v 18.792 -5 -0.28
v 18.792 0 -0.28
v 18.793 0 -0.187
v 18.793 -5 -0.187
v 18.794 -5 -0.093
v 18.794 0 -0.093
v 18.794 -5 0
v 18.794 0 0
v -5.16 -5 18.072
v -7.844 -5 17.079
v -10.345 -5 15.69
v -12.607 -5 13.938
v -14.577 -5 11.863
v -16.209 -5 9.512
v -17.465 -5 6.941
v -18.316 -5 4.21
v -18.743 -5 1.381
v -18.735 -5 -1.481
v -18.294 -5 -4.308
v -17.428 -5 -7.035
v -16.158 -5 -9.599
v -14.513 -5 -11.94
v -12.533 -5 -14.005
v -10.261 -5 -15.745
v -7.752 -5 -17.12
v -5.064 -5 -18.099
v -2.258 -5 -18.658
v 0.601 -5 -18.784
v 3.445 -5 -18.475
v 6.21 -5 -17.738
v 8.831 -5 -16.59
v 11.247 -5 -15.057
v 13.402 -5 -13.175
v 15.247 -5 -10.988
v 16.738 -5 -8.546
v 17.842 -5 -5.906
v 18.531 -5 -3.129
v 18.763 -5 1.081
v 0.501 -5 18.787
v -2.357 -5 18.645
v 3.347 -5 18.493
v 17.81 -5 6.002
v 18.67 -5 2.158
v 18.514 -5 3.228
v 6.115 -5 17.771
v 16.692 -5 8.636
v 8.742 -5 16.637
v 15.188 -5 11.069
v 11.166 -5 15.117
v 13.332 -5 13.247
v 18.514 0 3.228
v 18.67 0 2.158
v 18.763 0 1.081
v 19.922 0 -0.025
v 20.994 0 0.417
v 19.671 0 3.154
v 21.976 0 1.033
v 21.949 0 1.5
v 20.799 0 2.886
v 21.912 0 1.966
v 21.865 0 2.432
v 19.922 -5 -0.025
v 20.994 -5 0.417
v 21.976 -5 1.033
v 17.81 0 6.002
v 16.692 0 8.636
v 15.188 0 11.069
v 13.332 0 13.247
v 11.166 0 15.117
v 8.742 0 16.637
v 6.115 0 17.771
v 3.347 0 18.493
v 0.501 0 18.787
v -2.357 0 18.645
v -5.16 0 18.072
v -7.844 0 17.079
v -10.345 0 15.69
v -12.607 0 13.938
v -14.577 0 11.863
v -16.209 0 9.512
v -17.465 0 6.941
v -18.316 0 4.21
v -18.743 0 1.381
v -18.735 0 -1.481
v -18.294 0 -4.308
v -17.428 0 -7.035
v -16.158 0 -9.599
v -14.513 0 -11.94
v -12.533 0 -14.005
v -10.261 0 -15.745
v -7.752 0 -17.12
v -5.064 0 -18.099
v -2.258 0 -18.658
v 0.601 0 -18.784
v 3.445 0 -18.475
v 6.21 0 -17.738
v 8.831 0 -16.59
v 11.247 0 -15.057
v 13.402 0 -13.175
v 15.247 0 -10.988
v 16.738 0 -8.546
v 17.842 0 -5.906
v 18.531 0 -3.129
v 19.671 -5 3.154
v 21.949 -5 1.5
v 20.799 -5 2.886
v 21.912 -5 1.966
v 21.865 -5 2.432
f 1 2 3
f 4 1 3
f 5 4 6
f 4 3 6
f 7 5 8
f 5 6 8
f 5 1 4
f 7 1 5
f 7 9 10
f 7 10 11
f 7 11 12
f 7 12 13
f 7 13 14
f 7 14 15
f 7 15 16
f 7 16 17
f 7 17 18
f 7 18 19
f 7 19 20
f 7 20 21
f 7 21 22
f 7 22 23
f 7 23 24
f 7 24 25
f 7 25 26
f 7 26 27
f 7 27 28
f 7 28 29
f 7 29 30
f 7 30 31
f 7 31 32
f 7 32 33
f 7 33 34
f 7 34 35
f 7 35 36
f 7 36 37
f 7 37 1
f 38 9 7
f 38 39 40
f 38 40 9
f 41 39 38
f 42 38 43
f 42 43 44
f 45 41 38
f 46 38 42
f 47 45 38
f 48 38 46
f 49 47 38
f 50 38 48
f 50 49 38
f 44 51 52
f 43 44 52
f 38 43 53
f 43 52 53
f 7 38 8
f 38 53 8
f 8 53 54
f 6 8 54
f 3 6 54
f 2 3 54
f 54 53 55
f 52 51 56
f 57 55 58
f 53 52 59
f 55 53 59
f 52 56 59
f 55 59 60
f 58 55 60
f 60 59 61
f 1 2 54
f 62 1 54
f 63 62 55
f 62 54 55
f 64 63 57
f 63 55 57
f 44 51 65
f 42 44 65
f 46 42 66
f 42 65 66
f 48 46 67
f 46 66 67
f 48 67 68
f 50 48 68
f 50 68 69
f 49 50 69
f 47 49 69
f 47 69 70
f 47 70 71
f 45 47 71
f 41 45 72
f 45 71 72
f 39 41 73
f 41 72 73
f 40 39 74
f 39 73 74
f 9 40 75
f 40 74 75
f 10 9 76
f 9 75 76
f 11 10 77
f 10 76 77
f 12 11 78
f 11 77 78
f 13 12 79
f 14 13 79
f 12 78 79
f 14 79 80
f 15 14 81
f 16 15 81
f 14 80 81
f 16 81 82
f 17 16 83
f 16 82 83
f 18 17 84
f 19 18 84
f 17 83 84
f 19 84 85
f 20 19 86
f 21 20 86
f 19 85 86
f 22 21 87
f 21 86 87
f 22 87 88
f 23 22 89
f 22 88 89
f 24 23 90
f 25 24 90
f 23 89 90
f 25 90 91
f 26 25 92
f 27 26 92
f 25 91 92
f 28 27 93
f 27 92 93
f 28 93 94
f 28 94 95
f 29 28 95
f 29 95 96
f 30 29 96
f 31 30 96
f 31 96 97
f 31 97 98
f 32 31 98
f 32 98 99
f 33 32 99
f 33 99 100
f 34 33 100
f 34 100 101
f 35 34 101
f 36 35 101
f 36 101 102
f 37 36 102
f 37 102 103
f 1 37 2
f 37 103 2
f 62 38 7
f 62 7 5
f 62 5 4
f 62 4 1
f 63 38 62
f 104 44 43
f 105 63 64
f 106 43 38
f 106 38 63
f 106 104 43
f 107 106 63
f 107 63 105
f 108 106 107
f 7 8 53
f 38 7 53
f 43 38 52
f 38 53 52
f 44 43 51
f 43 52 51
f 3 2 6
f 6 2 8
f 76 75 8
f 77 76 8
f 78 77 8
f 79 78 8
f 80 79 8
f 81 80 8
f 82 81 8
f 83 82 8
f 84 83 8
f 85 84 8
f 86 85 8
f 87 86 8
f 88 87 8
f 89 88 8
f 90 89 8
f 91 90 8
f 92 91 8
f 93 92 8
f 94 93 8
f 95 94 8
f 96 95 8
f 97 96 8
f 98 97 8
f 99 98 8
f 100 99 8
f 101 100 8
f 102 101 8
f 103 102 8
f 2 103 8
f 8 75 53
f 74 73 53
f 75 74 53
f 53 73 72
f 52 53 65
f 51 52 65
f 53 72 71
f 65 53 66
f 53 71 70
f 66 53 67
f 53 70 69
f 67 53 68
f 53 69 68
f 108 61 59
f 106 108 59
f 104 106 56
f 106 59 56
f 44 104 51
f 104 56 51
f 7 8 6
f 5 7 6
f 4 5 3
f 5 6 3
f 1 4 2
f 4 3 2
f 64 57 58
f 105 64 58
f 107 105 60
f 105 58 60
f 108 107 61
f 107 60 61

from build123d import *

# Parameters (mm, degrees)
F1_DEPTH = 5
F2_DEPTH = 5


with BuildPart() as f1:
    # F0 (on Front) → F1 (new body)
    with BuildSketch(Plane.XZ):
        with BuildLine():
            ThreePointArc((18.791765, -0.2801), (18.793331, -0.140054), (18.793852, 0))
            ThreePointArc((18.793852, 0), (18.72388, 1.620246), (18.514485, 3.228427))
            ThreePointArc((18.514485, 3.228427), (-18.735435, -1.480668), (18.791765, -0.2801))
        make_face()
    extrude(amount=F1_DEPTH)


with BuildPart() as f2:
    # F0 (on Front) → F2 (new body)
    with BuildSketch(Plane.XZ):
        with BuildLine():
            ThreePointArc((18.514485, 3.228427), (18.72388, 1.620246), (18.793852, 0))
            ThreePointArc((18.793852, 0), (18.793331, -0.140054), (18.791765, -0.2801))
            ThreePointArc((18.791765, -0.2801), (20.4675, 0.173145), (21.975753, 1.032616))
            ThreePointArc((21.975753, 1.032616), (21.931616, 1.733264), (21.865147, 2.432146))
            ThreePointArc((21.865147, 2.432146), (20.240612, 3.044032), (18.514485, 3.228427))
        make_face()
    extrude(amount=F2_DEPTH)


solid = Compound([f1.part, f2.part])
